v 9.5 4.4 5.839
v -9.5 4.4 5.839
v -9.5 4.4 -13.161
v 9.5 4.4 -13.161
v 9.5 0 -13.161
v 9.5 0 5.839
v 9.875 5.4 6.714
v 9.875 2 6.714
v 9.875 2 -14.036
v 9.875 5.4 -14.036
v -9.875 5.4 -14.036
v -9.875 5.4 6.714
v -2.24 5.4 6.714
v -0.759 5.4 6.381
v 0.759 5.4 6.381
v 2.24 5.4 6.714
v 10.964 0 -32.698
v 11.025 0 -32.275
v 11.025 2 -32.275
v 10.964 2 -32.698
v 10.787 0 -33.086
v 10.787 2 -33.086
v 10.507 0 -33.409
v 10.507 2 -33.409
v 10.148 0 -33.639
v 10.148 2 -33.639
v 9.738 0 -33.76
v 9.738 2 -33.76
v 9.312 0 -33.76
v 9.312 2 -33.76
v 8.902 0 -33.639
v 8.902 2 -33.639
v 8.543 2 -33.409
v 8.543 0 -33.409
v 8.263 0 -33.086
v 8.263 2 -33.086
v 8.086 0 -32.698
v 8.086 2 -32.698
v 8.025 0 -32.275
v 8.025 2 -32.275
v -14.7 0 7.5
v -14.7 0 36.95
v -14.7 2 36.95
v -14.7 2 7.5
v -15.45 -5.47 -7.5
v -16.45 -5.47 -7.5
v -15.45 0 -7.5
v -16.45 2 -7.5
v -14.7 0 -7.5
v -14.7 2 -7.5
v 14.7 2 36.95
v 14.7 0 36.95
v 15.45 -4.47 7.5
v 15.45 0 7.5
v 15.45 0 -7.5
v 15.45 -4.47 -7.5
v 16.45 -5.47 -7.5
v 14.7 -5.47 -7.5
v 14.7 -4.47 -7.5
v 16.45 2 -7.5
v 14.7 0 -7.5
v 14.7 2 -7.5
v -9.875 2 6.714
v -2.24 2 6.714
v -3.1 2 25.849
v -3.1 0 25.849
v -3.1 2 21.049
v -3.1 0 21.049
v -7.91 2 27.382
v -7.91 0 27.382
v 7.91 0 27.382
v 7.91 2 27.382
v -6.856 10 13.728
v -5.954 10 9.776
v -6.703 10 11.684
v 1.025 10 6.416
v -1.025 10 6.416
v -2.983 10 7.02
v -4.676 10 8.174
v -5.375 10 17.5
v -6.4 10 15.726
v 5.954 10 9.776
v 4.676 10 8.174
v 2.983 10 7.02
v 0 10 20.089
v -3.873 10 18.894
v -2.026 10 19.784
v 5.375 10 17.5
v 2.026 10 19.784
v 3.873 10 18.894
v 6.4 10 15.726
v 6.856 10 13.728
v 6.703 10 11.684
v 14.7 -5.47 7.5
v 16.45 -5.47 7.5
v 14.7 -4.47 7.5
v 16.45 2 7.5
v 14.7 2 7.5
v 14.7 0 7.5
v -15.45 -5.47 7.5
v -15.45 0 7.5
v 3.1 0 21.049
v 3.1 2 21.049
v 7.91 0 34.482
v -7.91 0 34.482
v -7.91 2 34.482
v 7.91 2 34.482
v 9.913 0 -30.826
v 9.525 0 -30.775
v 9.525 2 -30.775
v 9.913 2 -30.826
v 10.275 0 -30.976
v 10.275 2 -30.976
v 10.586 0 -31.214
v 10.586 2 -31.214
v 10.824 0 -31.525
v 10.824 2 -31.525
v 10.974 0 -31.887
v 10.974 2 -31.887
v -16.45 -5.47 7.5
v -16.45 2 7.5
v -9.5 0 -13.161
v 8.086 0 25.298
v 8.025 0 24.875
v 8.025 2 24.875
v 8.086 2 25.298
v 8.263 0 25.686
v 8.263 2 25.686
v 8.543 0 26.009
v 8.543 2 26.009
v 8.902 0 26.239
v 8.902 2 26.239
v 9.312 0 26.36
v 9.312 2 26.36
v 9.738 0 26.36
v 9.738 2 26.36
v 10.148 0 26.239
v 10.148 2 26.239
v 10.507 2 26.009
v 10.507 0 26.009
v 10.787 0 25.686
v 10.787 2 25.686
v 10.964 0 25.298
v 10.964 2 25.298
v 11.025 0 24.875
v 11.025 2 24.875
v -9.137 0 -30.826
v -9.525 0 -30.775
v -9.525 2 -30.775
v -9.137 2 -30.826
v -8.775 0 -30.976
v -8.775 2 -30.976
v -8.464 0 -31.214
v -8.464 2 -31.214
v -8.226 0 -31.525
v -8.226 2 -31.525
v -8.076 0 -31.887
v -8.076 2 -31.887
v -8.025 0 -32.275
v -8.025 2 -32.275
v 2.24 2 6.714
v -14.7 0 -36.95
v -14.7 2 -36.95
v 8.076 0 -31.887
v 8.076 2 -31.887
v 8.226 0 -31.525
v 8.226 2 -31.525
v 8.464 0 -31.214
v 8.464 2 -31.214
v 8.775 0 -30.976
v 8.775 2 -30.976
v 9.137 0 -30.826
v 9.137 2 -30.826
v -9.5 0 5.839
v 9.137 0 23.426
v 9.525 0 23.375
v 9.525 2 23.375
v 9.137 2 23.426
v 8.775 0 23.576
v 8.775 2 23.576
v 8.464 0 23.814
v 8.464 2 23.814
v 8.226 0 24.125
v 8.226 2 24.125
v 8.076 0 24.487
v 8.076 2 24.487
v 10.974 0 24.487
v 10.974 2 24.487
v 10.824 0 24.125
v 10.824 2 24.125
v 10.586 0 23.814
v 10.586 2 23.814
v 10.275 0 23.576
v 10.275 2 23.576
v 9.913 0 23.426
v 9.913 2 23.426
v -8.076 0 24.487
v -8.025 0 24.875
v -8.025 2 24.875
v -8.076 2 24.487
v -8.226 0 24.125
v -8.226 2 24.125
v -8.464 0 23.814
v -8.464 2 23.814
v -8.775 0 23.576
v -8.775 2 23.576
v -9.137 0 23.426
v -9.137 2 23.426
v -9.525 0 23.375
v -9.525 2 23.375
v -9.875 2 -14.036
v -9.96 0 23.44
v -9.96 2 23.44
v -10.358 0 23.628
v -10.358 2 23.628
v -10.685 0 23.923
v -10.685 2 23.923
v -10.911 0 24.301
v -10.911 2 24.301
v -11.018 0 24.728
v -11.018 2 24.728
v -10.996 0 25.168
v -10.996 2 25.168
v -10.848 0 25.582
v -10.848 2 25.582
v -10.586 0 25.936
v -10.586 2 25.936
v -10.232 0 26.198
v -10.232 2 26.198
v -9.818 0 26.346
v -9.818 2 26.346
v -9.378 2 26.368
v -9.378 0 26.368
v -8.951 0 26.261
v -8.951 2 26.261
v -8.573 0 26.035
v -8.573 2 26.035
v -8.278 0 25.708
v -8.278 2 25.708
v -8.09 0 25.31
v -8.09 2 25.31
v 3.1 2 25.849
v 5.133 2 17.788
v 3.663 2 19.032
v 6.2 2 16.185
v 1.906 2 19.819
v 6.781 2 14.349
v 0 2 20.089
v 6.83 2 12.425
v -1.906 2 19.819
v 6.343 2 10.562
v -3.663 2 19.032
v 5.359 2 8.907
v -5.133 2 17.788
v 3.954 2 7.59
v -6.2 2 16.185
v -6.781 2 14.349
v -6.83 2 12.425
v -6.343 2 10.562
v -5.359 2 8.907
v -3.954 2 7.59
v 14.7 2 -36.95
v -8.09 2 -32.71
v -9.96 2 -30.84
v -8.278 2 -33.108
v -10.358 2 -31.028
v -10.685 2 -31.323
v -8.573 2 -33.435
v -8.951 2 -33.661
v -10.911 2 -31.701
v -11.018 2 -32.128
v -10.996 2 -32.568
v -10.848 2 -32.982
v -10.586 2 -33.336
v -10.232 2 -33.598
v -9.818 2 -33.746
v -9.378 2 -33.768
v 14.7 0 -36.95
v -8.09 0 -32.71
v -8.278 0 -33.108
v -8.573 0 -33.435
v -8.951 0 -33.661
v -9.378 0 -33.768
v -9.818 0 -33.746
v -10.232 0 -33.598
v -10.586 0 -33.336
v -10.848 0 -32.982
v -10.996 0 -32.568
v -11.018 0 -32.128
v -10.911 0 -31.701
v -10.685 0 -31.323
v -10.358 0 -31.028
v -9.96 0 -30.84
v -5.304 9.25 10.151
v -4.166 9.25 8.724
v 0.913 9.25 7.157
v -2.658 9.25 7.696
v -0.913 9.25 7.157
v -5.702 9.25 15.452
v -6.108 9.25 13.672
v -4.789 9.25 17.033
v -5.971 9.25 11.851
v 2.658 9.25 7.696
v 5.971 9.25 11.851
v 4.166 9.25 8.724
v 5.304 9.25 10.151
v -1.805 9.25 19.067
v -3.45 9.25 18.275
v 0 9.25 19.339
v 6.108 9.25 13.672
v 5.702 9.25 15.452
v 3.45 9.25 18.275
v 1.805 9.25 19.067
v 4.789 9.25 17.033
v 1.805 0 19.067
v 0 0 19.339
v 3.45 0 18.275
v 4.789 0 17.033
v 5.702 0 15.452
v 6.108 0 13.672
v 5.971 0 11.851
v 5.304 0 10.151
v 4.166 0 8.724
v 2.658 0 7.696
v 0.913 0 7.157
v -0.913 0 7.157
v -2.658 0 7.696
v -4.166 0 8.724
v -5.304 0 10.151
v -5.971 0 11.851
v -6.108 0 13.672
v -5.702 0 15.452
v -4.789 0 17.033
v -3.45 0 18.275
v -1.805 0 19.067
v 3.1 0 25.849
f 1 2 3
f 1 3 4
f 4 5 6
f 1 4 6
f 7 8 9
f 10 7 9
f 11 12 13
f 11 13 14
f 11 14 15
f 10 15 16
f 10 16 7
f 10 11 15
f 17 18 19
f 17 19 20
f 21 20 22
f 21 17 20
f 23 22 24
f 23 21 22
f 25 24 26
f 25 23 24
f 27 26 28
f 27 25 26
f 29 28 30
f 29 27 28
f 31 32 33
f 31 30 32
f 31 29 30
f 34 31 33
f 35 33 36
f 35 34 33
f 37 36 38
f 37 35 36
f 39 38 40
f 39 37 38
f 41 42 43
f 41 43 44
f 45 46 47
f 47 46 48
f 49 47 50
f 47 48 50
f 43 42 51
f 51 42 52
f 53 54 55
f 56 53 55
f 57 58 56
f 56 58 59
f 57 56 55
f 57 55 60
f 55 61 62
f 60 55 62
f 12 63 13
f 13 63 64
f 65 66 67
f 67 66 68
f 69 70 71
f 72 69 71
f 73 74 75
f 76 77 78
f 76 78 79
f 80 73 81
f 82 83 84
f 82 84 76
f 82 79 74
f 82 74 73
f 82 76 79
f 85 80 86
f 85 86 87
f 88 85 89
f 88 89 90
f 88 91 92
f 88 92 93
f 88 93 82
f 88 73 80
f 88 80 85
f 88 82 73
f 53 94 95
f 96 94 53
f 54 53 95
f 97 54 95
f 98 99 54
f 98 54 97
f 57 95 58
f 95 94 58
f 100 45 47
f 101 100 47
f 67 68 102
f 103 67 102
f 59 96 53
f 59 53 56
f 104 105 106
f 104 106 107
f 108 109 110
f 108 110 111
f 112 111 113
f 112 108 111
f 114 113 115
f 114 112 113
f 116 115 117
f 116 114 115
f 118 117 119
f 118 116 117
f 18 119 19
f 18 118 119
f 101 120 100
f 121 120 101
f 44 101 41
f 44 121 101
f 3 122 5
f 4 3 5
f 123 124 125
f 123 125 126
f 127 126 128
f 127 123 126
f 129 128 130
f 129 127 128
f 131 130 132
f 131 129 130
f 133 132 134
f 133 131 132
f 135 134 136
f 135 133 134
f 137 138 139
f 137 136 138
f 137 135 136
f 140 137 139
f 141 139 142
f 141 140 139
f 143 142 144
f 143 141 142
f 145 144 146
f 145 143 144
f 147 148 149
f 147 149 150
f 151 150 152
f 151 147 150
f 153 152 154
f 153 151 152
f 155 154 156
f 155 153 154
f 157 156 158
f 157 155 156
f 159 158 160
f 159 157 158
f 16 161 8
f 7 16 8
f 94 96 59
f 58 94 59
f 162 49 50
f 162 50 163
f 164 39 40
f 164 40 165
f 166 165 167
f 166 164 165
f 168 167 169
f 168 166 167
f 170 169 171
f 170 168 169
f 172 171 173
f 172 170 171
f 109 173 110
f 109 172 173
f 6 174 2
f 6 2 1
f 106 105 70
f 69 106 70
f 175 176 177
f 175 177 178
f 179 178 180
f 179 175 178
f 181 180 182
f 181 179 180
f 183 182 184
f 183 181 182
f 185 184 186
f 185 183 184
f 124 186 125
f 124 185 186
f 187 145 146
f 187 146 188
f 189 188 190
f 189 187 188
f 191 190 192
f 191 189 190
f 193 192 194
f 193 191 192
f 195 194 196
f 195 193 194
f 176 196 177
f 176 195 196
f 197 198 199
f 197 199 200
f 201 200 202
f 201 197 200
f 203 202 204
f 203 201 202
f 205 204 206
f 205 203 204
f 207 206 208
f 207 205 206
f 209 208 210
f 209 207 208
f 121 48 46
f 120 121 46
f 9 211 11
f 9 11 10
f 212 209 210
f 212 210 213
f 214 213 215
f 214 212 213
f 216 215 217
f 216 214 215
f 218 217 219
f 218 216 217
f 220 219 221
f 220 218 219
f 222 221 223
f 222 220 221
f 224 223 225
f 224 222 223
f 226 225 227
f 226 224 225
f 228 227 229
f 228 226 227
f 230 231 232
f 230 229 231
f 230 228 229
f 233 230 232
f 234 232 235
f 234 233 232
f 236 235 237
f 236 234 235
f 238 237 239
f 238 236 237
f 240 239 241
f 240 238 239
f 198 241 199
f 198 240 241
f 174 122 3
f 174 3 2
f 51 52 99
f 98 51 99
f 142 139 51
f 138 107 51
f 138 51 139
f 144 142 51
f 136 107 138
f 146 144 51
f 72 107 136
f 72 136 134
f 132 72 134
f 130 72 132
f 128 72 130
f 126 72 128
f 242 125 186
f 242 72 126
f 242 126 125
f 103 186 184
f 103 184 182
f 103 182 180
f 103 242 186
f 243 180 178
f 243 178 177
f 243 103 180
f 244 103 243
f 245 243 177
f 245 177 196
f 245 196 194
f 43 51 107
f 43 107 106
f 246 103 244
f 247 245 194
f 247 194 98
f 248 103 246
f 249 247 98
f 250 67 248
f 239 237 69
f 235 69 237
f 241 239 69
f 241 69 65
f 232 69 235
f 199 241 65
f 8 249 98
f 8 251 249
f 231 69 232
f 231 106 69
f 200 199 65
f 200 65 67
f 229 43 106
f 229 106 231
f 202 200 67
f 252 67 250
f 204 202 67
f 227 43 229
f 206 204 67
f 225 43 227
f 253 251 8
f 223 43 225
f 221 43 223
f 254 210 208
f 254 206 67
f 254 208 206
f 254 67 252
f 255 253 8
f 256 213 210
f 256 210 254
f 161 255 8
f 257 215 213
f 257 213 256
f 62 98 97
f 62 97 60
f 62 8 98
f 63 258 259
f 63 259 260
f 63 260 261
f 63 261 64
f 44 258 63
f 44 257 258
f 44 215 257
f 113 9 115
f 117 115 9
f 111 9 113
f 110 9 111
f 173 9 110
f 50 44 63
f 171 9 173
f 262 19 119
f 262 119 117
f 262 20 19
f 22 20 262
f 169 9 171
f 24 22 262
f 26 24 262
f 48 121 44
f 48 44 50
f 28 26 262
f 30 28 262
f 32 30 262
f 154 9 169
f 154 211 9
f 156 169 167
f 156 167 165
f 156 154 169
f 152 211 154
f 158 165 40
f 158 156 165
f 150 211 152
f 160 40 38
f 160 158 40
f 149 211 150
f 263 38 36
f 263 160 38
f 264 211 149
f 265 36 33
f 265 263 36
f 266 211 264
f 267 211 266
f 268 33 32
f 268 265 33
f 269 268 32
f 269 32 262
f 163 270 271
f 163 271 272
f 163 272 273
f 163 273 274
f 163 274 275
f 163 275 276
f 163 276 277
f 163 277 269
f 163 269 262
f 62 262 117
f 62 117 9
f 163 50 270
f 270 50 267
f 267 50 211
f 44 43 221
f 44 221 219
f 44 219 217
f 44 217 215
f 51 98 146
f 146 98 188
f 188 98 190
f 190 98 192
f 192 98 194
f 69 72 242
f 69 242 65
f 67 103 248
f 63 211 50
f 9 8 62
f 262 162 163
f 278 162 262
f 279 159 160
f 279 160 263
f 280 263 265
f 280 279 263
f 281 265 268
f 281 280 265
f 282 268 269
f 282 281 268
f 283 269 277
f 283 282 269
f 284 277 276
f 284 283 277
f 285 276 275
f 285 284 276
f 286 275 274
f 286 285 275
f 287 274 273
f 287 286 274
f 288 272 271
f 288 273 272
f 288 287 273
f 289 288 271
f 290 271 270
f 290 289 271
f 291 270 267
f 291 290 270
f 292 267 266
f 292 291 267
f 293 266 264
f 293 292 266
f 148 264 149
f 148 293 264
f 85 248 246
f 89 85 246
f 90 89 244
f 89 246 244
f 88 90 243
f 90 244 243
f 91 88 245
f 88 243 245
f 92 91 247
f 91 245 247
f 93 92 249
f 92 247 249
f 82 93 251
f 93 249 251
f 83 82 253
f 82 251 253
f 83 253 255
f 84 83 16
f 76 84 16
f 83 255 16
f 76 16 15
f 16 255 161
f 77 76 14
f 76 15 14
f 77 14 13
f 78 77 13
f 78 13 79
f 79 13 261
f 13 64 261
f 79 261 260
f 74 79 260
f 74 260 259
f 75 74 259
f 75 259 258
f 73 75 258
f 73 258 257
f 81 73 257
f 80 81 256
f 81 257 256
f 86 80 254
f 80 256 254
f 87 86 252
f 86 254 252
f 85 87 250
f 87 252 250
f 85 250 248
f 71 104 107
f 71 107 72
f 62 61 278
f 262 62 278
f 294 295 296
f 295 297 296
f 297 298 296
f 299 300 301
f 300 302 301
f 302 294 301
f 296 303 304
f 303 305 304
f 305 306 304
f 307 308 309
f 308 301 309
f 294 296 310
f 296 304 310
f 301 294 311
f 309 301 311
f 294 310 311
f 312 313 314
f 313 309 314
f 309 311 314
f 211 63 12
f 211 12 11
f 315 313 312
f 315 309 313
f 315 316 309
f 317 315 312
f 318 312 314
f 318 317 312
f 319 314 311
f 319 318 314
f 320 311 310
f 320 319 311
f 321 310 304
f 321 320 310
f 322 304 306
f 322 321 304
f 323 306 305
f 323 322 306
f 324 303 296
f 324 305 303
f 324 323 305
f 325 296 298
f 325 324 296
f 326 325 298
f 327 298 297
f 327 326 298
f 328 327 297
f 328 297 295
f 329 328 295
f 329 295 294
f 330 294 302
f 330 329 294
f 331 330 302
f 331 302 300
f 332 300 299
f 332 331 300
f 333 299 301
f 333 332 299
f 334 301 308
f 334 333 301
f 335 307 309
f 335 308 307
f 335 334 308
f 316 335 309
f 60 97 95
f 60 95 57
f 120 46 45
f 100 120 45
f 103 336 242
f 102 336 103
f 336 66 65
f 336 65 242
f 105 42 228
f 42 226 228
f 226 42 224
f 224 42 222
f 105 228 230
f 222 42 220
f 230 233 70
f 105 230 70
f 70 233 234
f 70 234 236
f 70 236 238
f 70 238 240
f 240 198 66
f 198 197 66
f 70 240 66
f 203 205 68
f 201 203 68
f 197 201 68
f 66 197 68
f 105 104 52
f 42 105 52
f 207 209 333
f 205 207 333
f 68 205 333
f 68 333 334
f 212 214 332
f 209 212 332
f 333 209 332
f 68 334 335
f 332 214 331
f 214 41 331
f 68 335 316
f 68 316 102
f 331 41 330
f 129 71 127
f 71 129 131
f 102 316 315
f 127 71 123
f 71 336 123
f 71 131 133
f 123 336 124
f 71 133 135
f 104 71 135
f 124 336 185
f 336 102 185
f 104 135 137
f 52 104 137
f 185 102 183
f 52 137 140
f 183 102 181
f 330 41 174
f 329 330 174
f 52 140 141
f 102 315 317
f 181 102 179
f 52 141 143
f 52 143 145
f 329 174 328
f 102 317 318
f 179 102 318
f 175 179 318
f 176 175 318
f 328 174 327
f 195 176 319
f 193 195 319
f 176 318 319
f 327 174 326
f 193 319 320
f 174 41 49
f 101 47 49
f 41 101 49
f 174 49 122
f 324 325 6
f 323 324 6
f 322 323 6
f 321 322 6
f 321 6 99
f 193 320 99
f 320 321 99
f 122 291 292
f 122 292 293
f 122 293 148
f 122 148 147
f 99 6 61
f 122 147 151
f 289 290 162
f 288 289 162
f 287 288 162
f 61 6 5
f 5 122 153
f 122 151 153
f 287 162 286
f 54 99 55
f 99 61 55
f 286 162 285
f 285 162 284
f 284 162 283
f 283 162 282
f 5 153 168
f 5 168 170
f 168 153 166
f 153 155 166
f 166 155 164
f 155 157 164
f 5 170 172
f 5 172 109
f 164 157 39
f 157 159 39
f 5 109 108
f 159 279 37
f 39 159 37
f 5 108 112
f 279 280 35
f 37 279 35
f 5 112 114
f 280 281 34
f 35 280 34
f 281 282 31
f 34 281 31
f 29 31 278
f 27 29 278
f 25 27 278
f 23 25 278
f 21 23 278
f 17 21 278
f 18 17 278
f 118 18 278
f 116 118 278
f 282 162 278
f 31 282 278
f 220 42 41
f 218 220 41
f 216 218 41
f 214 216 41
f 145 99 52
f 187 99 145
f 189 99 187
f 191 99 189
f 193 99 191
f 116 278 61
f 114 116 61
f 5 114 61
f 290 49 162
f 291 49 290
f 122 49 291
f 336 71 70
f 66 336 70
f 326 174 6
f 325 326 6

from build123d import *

# Parameters (mm, degrees)
SKETCH1_W               = 29.4
SKETCH1_H               = 73.9
SKETCH1_W_2             = 15.82
SKETCH1_H_2             = 7.1
SKETCH1_W_3             = 6.2
SKETCH1_H_3             = 4.8
BOSS_EXTRUDE1_DEPTH     = 2
SKETCH1_3_R             = 6.875
BOSS_EXTRUDE2_DEPTH     = 10
SHELL1_T                = -0.75
SKETCH1_4_W             = 19.75
SKETCH1_4_H             = 20.75
BOSS_EXTRUDE3_DEPTH     = 5.4
SKETCH2_W               = 19
SKETCH2_H               = 19
CUT_EXTRUDE1_DEPTH      = 4.4
CUT_EXTRUDE2_DEPTH      = 41.563437971
CUT_EXTRUDE2_DEPTH_BACK = 41.563437971
SKETCH5_W               = 15
SKETCH5_H               = 1
SKETCH5_W_2             = 7.5
SKETCH5_H_2             = 2
BOSS_EXTRUDE4_DEPTH     = 0.75
SKETCH6_W               = 15
SKETCH6_H               = 7.47
BOSS_EXTRUDE5_DEPTH     = 1
MIRROR1_START           = -7.5
MIRROR1_DEPTH           = 15


# Read off the part's stored shape, not the designer's step: Mirror1
with BuildPart() as part:
    # Sketch1 → Boss-Extrude1 (new body)
    with BuildSketch(Plane(origin=(0, 0, 0), x_dir=(1, 0, 0), z_dir=(0, 1, 0))):
        Rectangle(SKETCH1_W, SKETCH1_H)
        with Locations((0, -30.932)):
            Rectangle(SKETCH1_W_2, SKETCH1_H_2, mode=Mode.SUBTRACT)
        with Locations((0, -23.449)):
            Rectangle(SKETCH1_W_3, SKETCH1_H_3, mode=Mode.SUBTRACT)
        with BuildLine():
            Line((-9.875, 14.036), (9.875, 14.036))
            Line((9.875, 14.036), (9.875, -6.714))
            Line((9.875, -6.714), (2.239559108, -6.714))
            ThreePointArc((2.239559108, -6.714), (0, -20.089), (-2.239559108, -6.714))
            Line((-2.239559108, -6.714), (-9.875, -6.714))
            Line((-9.875, -6.714), (-9.875, 14.036))
        make_face(mode=Mode.SUBTRACT)
    extrude(amount=BOSS_EXTRUDE1_DEPTH)



with BuildPart() as body_2:
    # Sketch1<3> → Boss-Extrude2 (new body)
    with BuildSketch(Plane(origin=(0, 0, 0), x_dir=(1, 0, 0), z_dir=(0, 1, 0))):
        with Locations(Location((0, -13.214, 0), (0, 0, 270))):
            Circle(SKETCH1_3_R)
    extrude(amount=BOSS_EXTRUDE2_DEPTH)

    # Shell1
    shell1_openings = [body_2.faces().sort_by_distance(p)[0] for p in [
        (0, 0, 13.214),
    ]]
    offset(amount=SHELL1_T, openings=shell1_openings, kind=Kind.INTERSECTION)


with BuildPart() as part_1:
    add(part.part)

    add(body_2.part)  # Boss-Extrude3 merges body 2
    # Sketch1<4> → Boss-Extrude3 (add)
    with BuildSketch(Plane(origin=(0, 0, 0), x_dir=(1, 0, 0), z_dir=(0, 1, 0))):
        with Locations((0, 3.661)):
            Rectangle(SKETCH1_4_W, SKETCH1_4_H)
    extrude(amount=BOSS_EXTRUDE3_DEPTH)

    # Sketch2 → Cut-Extrude1 (cut)
    with BuildSketch(Plane.XZ):
        with Locations((0, -3.661)):
            Rectangle(SKETCH2_W, SKETCH2_H)
    extrude(amount=-CUT_EXTRUDE1_DEPTH, mode=Mode.SUBTRACT)

    # Sketch3 → Cut-Extrude2 (cut, two sides: drawn at the far end of the back side and taken through both)
    with BuildSketch(Plane(origin=(0, 2, 0), x_dir=(1, 0, 0), z_dir=(0, 1, 0)).offset(-CUT_EXTRUDE2_DEPTH_BACK)):
        with BuildLine():
            Line((-9.525, 30.775), (-9.525, 32.275))
            Line((-9.525, 32.275), (-8.025, 32.275))
            ThreePointArc((-8.025, 32.275), (-10.585660172, 33.335660172), (-9.525, 30.775))
        make_face()
        with BuildLine():
            Line((-8.025, 32.275), (-9.525, 32.275))
            Line((-9.525, 32.275), (-9.525, 30.775))
            ThreePointArc((-9.525, 30.775), (-8.464339828, 31.214339828), (-8.025, 32.275))
        make_face()
        with BuildLine():
            ThreePointArc((11.025, 32.275), (9.525, 33.775), (8.025, 32.275))
            Line((8.025, 32.275), (9.525, 32.275))
            Line((9.525, 32.275), (9.525, 30.775))
            ThreePointArc((9.525, 30.775), (10.585660172, 31.214339828), (11.025, 32.275))
        make_face()
        with BuildLine():
            Line((9.525, 32.275), (8.025, 32.275))
            ThreePointArc((8.025, 32.275), (8.464339828, 31.214339828), (9.525, 30.775))
            Line((9.525, 30.775), (9.525, 32.275))
        make_face()
        with BuildLine():
            ThreePointArc((11.025, -24.875), (10.585660172, -23.814339828), (9.525, -23.375))
            Line((9.525, -23.375), (9.525, -24.875))
            Line((9.525, -24.875), (8.025, -24.875))
            ThreePointArc((8.025, -24.875), (9.525, -26.375), (11.025, -24.875))
        make_face()
        with BuildLine():
            Line((9.525, -24.875), (9.525, -23.375))
            ThreePointArc((9.525, -23.375), (8.464339828, -23.814339828), (8.025, -24.875))
            Line((8.025, -24.875), (9.525, -24.875))
        make_face()
        with BuildLine():
            ThreePointArc((-8.025, -24.875), (-8.464339828, -23.814339828), (-9.525, -23.375))
            Line((-9.525, -23.375), (-9.525, -24.875))
            Line((-9.525, -24.875), (-8.025, -24.875))
        make_face()
        with BuildLine():
            Line((-9.525, -24.875), (-9.525, -23.375))
            ThreePointArc((-9.525, -23.375), (-10.585660172, -25.935660172), (-8.025, -24.875))
            Line((-8.025, -24.875), (-9.525, -24.875))
        make_face()
    extrude(amount=CUT_EXTRUDE2_DEPTH + CUT_EXTRUDE2_DEPTH_BACK, mode=Mode.SUBTRACT)

    # Sketch5 → Boss-Extrude4 (add)
    with BuildSketch(Plane(origin=(14.7, 0, 0), x_dir=(0, 0, -1), z_dir=(1, 0, 0))):
        with Locations((0, -4.97)):
            Rectangle(SKETCH5_W, SKETCH5_H)
        with Locations((-3.75, 1)):
            Rectangle(SKETCH5_W_2, SKETCH5_H_2)
        with Locations((3.75, 1)):
            Rectangle(SKETCH5_W_2, SKETCH5_H_2)
    extrude(amount=BOSS_EXTRUDE4_DEPTH)


with BuildPart() as boss_extrude4_piece_1:
    # of the separate pieces the step leaves, piece 1, a body of its own (boss_extrude4_pieces)
    add(part_1.part.solids().sort_by_distance((-14.7, 0, 36.95))[0])



with BuildPart() as boss_extrude4_piece_2:
    # of the separate pieces the step leaves, piece 2, a body of its own (boss_extrude4_pieces)
    add(part_1.part.solids().sort_by_distance((14.7, -4.47, -7.5))[0])


with BuildPart() as boss_extrude4_piece_1_1:
    add(boss_extrude4_piece_1.part)

    add(boss_extrude4_piece_2.part)  # Boss-Extrude5 merges Boss-Extrude4 piece 2
    # Sketch6 → Boss-Extrude5 (add)
    with BuildSketch(Plane(origin=(15.45, 0, 0), x_dir=(0, 0, -1), z_dir=(1, 0, 0))):
        with Locations((0, -1.735)):
            Rectangle(SKETCH6_W, SKETCH6_H)
    extrude(amount=BOSS_EXTRUDE5_DEPTH)

    # Mirror1 outline → Mirror1 (add)
    with BuildSketch(Plane.XY.offset(MIRROR1_START)):
        Polygon((-16.45, 2), (-16.45, -5.47), (-15.45, -5.47), (-15.45, 0), (-14.7, 0), (-14.7, 2), align=None)
    extrude(amount=MIRROR1_DEPTH)


solid = boss_extrude4_piece_1_1.part
